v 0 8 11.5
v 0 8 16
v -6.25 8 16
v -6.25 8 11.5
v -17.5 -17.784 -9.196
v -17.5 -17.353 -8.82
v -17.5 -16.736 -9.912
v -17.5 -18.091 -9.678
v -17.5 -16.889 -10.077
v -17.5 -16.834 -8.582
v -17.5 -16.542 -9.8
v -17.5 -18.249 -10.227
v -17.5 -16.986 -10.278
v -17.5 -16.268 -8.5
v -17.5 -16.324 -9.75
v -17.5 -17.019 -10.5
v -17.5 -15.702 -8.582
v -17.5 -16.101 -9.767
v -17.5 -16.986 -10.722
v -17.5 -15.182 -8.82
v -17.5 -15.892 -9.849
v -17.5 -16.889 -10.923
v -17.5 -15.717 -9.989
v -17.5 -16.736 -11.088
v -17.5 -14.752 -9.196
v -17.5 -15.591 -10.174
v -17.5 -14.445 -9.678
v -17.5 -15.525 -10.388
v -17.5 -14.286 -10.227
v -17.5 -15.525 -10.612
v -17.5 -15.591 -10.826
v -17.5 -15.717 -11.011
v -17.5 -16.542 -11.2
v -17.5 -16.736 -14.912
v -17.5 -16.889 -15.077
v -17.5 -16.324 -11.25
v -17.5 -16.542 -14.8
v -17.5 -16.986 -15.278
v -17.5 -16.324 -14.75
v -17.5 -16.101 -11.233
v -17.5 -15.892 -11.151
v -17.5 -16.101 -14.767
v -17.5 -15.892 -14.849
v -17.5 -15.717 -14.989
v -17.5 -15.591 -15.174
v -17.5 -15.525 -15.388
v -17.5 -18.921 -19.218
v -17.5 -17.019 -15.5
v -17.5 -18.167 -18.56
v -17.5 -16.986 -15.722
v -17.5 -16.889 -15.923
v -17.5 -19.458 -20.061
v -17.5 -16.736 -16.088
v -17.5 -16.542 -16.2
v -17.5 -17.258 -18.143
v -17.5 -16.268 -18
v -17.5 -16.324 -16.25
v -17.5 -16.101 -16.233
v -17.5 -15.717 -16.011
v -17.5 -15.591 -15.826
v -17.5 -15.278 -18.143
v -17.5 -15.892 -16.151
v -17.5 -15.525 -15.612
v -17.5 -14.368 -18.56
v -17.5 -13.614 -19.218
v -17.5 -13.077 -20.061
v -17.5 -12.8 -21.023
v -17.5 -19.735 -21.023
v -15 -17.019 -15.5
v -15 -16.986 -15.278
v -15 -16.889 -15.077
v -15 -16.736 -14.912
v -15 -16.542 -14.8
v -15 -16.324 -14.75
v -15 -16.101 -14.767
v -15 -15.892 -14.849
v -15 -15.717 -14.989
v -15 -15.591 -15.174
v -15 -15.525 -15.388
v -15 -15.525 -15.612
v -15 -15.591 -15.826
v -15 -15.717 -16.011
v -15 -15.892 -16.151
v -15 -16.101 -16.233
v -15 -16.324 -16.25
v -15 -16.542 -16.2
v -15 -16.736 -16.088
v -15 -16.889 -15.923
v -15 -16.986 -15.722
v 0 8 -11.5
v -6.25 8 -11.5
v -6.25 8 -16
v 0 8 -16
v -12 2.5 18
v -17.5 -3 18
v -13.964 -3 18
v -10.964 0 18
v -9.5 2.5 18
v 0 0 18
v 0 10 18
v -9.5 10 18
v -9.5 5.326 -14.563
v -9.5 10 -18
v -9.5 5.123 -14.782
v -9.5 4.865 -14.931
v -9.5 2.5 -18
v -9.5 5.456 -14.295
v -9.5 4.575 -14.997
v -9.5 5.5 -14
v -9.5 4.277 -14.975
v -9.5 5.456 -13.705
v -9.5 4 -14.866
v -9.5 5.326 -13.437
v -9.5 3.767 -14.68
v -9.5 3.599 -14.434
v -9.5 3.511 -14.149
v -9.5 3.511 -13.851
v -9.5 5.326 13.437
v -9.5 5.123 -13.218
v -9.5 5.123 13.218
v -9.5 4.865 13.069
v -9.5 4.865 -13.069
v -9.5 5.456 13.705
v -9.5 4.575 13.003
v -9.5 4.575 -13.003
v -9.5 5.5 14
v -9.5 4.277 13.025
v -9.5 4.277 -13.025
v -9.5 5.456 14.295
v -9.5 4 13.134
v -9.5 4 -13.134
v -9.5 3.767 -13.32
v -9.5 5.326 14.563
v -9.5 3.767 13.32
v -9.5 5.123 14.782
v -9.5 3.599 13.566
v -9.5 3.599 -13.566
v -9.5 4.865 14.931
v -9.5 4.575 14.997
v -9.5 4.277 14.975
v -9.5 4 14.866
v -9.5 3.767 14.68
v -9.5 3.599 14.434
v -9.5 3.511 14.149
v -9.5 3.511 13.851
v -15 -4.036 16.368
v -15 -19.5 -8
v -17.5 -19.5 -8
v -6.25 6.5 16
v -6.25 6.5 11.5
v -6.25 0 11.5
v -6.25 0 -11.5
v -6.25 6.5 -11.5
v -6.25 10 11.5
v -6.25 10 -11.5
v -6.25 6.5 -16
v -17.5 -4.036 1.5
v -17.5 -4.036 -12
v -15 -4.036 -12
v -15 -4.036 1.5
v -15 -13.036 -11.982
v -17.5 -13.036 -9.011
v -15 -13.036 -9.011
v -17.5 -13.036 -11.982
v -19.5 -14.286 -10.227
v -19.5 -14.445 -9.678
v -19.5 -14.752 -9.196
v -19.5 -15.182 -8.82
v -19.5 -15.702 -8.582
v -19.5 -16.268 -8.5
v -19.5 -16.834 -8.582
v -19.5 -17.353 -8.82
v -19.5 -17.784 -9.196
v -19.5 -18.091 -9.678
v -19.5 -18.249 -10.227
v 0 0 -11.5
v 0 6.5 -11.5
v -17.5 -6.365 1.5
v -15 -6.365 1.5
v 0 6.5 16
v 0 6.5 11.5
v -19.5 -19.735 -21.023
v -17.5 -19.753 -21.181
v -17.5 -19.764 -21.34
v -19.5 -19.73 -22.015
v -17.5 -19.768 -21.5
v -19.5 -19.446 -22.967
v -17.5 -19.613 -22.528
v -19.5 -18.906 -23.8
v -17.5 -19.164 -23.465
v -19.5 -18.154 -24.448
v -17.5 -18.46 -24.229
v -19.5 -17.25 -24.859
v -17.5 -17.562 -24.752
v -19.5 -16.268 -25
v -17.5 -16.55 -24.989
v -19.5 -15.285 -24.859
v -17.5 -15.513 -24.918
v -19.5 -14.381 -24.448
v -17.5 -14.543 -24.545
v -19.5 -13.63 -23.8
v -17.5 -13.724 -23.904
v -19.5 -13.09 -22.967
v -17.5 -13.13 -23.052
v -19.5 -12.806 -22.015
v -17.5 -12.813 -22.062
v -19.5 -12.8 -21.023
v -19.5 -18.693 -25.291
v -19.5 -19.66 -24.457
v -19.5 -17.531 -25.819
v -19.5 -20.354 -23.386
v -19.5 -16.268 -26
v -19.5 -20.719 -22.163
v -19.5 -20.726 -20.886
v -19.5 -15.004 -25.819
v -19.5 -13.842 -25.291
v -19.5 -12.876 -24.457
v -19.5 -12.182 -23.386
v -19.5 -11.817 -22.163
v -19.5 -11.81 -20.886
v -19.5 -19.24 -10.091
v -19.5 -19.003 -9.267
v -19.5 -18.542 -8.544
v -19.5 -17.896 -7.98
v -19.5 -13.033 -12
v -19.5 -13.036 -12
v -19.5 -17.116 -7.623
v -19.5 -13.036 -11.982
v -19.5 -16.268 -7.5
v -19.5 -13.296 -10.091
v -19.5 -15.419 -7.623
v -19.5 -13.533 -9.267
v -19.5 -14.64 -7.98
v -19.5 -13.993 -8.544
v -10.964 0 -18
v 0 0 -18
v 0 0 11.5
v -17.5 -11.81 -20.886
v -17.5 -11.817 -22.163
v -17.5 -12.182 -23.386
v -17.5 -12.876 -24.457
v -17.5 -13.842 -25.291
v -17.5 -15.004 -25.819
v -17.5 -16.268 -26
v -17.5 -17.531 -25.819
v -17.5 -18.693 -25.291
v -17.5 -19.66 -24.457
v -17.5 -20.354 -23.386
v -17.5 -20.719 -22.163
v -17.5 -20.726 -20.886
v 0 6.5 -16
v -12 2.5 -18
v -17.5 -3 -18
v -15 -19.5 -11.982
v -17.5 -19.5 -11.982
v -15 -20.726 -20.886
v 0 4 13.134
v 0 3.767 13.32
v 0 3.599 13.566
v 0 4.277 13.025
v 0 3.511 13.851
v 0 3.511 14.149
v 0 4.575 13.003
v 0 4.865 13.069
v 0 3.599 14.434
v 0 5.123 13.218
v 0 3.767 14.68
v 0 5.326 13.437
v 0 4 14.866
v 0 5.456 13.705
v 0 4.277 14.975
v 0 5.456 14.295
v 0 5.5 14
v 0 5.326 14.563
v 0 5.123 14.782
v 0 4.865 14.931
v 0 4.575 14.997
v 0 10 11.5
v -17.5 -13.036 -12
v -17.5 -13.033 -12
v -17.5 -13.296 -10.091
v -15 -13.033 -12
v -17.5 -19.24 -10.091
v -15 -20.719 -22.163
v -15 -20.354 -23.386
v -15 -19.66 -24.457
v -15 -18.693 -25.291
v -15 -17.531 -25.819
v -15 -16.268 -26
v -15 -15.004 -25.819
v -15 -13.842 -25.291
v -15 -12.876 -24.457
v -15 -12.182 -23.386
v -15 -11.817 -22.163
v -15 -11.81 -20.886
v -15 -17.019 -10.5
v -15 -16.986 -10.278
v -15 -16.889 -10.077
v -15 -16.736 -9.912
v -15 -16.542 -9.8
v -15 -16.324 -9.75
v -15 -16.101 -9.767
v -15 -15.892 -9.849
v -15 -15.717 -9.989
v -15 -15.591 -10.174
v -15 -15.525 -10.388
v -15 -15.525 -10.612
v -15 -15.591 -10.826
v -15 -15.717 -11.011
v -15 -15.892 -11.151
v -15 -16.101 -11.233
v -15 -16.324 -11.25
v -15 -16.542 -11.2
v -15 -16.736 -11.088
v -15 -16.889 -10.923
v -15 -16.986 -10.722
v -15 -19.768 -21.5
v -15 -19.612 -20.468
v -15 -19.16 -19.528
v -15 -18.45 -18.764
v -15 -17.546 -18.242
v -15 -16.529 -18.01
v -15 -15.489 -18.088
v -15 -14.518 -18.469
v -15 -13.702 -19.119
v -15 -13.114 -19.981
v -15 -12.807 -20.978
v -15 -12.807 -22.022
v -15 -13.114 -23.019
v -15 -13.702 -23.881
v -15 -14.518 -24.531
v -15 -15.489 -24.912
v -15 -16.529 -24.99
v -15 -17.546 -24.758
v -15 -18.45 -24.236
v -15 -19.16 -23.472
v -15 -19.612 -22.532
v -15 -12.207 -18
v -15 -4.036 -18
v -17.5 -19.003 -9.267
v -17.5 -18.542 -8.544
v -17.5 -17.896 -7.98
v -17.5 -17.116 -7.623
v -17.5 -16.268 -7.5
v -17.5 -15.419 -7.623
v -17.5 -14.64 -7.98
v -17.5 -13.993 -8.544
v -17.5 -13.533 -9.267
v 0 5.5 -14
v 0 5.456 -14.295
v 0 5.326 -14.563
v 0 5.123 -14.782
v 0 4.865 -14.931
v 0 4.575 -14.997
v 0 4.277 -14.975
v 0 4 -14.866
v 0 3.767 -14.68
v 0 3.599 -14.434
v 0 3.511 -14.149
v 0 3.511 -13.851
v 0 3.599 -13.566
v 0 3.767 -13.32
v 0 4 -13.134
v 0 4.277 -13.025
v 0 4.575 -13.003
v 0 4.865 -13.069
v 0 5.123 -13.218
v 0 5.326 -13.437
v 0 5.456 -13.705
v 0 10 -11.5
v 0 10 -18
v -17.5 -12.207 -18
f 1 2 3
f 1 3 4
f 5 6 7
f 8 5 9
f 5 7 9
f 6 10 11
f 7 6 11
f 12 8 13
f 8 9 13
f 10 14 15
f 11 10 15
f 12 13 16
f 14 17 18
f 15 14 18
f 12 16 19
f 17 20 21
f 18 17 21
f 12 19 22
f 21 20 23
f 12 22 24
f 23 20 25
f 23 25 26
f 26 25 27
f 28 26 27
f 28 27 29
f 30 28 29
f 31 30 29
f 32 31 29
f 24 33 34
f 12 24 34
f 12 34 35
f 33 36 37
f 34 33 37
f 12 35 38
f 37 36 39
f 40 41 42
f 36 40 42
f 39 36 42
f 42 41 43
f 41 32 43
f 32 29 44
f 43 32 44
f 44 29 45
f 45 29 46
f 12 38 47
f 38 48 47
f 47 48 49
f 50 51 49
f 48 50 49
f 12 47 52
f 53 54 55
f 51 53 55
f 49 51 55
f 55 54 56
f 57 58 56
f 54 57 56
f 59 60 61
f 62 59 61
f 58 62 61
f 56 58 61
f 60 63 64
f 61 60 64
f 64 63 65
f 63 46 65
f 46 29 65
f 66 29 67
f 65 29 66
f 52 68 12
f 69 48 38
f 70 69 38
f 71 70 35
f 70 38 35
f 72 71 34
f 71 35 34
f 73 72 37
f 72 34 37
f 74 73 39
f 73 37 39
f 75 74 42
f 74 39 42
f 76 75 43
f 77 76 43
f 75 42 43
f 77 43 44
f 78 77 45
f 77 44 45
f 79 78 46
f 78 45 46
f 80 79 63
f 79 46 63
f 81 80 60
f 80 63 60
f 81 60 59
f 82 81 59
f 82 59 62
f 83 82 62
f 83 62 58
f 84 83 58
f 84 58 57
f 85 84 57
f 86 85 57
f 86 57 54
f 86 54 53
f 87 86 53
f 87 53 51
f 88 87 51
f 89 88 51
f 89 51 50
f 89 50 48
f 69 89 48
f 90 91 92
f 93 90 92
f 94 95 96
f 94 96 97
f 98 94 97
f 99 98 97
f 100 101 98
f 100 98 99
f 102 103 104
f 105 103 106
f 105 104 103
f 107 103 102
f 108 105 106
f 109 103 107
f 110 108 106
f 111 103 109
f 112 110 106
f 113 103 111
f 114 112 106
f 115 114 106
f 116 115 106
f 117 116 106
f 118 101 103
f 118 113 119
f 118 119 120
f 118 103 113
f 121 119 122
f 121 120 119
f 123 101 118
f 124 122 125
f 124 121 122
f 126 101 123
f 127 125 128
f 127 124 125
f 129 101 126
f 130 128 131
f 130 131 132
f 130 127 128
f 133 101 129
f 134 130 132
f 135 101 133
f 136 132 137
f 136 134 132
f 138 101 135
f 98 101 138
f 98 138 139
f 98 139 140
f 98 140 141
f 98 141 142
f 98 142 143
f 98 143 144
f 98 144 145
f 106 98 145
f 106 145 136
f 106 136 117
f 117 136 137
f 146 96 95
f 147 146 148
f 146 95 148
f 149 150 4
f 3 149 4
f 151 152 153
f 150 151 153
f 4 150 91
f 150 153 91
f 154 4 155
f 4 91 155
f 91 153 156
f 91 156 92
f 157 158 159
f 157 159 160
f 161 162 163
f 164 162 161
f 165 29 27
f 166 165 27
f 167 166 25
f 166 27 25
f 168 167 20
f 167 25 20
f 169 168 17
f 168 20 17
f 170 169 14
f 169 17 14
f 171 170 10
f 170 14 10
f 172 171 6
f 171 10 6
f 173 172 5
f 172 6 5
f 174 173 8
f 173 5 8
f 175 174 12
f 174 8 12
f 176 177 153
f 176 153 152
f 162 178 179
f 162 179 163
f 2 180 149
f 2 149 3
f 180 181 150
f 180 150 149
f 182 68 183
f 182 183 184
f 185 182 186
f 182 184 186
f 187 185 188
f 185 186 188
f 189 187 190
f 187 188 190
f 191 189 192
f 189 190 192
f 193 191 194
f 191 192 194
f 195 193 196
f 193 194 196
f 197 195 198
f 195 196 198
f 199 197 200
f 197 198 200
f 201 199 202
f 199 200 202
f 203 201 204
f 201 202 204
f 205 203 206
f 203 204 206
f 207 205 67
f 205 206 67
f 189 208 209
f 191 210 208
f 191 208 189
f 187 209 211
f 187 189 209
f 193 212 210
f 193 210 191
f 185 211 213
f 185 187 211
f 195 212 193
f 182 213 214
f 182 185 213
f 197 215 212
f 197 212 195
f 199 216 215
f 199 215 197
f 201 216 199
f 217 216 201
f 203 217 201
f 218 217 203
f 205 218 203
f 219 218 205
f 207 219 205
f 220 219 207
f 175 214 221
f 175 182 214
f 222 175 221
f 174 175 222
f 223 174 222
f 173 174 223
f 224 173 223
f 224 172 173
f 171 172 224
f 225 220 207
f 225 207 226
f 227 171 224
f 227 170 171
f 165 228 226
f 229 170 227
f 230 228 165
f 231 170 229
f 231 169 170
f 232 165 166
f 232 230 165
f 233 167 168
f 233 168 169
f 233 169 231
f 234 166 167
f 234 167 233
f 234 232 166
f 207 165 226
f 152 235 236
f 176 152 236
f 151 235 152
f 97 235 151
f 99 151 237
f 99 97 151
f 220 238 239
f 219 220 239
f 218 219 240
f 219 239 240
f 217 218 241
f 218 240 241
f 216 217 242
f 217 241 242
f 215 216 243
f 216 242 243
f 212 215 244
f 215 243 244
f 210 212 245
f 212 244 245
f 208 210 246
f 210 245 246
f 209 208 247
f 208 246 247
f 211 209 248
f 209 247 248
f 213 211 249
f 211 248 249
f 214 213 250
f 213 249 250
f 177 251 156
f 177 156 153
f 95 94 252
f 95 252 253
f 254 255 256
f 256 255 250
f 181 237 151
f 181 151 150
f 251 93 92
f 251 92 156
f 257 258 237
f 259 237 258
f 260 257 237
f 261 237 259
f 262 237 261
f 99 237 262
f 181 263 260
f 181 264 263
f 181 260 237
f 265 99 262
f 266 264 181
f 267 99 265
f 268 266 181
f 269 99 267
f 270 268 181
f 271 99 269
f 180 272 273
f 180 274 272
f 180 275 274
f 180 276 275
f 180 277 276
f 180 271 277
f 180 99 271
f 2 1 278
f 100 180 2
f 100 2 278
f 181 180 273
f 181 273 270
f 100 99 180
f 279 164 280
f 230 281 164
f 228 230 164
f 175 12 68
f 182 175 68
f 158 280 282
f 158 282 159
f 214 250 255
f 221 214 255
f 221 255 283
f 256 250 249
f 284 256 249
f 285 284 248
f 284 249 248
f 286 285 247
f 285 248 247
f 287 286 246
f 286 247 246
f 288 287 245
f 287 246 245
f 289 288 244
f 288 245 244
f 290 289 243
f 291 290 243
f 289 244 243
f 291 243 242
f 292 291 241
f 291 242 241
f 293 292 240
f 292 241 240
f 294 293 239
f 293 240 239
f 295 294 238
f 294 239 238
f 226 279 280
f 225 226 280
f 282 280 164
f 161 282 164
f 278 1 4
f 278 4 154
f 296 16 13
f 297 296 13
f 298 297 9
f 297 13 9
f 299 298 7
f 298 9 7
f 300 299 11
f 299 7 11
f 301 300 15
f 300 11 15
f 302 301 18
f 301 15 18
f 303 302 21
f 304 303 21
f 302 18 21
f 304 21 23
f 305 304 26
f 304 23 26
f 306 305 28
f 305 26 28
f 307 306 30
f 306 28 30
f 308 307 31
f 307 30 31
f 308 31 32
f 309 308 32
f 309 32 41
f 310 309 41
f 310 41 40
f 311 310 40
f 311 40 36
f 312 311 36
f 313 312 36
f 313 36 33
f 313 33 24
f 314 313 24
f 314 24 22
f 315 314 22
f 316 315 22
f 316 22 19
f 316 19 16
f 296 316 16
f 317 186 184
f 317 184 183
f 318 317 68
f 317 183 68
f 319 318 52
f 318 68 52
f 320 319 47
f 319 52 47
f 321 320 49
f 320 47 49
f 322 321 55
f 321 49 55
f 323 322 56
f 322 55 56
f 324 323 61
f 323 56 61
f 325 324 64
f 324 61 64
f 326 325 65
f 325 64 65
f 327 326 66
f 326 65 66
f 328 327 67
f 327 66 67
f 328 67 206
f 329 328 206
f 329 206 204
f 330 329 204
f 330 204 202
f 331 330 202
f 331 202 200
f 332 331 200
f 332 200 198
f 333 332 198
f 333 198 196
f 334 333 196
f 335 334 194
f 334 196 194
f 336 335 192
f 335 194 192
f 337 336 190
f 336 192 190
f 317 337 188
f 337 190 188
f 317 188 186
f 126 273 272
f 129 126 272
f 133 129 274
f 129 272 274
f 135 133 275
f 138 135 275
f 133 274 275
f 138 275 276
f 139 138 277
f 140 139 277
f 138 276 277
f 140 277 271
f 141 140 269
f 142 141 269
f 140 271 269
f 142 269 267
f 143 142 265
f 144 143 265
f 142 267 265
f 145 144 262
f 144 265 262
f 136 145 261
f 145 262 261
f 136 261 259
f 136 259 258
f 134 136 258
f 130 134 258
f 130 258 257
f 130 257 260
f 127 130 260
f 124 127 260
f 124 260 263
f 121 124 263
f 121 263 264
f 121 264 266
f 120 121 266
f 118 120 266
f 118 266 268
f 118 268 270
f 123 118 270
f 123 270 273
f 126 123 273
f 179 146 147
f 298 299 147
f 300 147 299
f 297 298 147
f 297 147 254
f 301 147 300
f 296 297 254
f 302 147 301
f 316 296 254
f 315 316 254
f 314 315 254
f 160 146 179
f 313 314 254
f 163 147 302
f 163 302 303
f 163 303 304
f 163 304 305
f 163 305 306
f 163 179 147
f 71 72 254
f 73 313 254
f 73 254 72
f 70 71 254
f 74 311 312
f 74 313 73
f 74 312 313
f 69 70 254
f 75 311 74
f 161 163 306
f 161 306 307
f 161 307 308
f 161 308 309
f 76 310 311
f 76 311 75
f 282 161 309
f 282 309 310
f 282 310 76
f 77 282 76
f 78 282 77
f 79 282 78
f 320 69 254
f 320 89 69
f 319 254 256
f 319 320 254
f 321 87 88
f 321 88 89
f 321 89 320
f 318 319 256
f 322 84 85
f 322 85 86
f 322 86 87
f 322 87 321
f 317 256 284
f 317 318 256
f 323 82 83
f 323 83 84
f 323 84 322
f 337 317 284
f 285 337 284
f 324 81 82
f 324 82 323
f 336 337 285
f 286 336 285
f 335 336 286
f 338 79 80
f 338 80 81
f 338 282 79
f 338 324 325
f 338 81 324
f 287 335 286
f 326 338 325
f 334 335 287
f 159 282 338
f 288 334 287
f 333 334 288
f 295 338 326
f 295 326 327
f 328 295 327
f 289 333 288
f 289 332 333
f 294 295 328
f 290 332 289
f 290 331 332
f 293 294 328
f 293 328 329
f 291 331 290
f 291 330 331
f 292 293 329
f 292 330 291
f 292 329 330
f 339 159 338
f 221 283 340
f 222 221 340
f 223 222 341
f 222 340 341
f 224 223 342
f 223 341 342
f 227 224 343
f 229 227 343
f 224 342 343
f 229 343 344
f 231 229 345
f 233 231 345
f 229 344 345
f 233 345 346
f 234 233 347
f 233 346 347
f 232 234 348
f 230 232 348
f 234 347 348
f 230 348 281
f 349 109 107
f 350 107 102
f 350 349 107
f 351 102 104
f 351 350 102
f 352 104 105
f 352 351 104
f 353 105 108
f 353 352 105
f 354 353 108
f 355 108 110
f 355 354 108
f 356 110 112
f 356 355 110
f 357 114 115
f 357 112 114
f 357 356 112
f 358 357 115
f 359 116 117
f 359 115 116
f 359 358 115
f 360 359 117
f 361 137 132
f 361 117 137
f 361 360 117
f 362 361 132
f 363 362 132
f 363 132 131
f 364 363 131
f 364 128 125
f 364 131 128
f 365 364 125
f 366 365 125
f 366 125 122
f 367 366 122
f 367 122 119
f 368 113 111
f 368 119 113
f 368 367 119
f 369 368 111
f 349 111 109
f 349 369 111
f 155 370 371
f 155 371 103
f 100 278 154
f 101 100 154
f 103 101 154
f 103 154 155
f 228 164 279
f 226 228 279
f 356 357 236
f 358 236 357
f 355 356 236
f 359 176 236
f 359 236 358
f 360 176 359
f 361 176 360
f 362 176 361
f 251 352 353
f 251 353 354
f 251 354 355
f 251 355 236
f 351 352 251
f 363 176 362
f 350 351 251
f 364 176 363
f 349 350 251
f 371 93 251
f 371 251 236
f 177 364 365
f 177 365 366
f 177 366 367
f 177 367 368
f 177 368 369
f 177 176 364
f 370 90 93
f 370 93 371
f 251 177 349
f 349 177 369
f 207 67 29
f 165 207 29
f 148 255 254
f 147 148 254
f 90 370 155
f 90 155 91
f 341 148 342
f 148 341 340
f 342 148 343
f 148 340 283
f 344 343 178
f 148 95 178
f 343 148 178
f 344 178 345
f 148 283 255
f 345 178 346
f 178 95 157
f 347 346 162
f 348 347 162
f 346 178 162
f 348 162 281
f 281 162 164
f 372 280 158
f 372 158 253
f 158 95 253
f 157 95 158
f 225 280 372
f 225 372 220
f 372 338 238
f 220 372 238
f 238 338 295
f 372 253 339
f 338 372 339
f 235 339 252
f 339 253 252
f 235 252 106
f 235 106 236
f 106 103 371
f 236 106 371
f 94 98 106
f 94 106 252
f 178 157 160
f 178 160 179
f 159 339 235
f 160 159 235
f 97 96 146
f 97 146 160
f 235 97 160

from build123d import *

# Parameters (mm, degrees)
EXTRUDE_1_DEPTH     = 18
CUT_EXTRUDE_1_REACH = 33.788
CUT_EXTRUDE_2_DEPTH = 6.25
SKETCH_4_R          = 1.0000000000000013
CUT_EXTRUDE_3_DEPTH = 10
SKETCH_8_R          = 3.4999999999999996
SKETCH_8_R_2        = 0.751628678477691
SKETCH_8_R_3        = 0.7516286784776927
EXTRUDE_2_DEPTH     = 2.5
EXTRUDE_3_DEPTH     = 2
CUT_EXTRUDE_4_REACH = 39.597
SKETCH_8_4_R        = 0.751628678477691
SKETCH_8_4_R_2      = 0.7516286784776927


# Read off the part's stored shape, not the designer's step: 凸台-拉伸3
with BuildPart() as part:
    # 草图1 → 凸台-拉伸1 (new, symmetric)
    with BuildSketch(Plane.XY):
        Polygon((0, 0), (0, 10), (-9.5, 9.999999999999998), (-9.499999999999998, 2.5000000000000004), (-11.999999999999998, 2.5), (-17.499999999999996, -3.0000000000000218), (-17.499999999999996, -19.5), (-14.999999999999995, -19.500000000000004), (-14.999999999999995, -4.035533905932752), (-10.964466094067257, -4e-17), align=None)
    extrude(amount=EXTRUDE_1_DEPTH, both=True)

    # 草图2 → 切除-拉伸1 (cut, up to next)
    with BuildSketch(Plane.ZY.offset(17.499999999999996), mode=Mode.PRIVATE) as cut_extrude_1_sk1:
        Polygon((-9.011266099163953, -13.03553390593275), (-11.999999999999996, -13.03553390593275), (-11.999999999999998, -4.035533905932751), (1.5000000000000013, -4.035533905932748), (1.500000000000002, -6.364922727617167), align=None)
    cut_extrude_1_tool1 = extrude(cut_extrude_1_sk1.sketch, amount=-CUT_EXTRUDE_1_REACH, mode=Mode.PRIVATE) & part.part
    # 草图2 → 切除-拉伸1 (cut, up to next)
    with BuildSketch(Plane.ZY.offset(17.499999999999996), mode=Mode.PRIVATE) as cut_extrude_1_sk2:
        Polygon((-7.9999999999999964, -19.499999999999996), (18, -19.49999999999999), (18, -3.000000000000014), align=None)
    cut_extrude_1_tool2 = extrude(cut_extrude_1_sk2.sketch, amount=-CUT_EXTRUDE_1_REACH, mode=Mode.PRIVATE) & part.part
    add(cut_extrude_1_tool1.solids().sort_by_distance((-17.5, -7.612266, -6.566584))[0], mode=Mode.SUBTRACT)
    add(cut_extrude_1_tool2.solids().sort_by_distance((-17.5, -14, 9.333333))[0], mode=Mode.SUBTRACT)

    # 草图3 → 切除-拉伸2 (cut, symmetric)
    with BuildSketch(Plane(origin=(0, 8.89452112858794, -0.8331769279117781), x_dir=(0, -1, 0), z_dir=(1, 0, 0))):
        Polygon((2.3945211285879346, 15.166823072088224), (2.3945211285879346, 10.666823072088222), (8.894521128587936, 10.666823072088222), (8.894521128587936, -12.333176927911778), (2.394521128587931, -12.333176927911778), (2.3945211285879346, -16.833176927911776), (0.8945211285879351, -16.833176927911776), (0.8945211285879351, -12.33317692791178), (-3.1054788714120676, -12.333176927911778), (-3.105478871412064, 10.66682307208822), (0.8945211285879369, 10.66682307208822), (0.8945211285879351, 15.166823072088224), align=None)
    extrude(amount=CUT_EXTRUDE_2_DEPTH, both=True, mode=Mode.SUBTRACT)

    # 草图4 → 切除-拉伸3 (cut)
    with BuildSketch(Plane(origin=(0, 0, 0), x_dir=(0, 0, -1), z_dir=(1, 0, 0))):
        with Locations(Location((-14, 4.500000000000008, 0), (0, 0, 90))):
            Circle(SKETCH_4_R)
    cut_extrude_3 = extrude(amount=-CUT_EXTRUDE_3_DEPTH, mode=Mode.SUBTRACT)

    # 镜向1: 切除-拉伸3 across plane
    add(cut_extrude_3.mirror(Plane.XY), mode=Mode.SUBTRACT)

    # 草图8 → 凸台-拉伸2 (add)
    with BuildSketch(Plane.ZY.offset(17.499999999999996)):
        with BuildLine():
            Line((-20.886363636363633, -11.809802124345238), (-10.090909090909088, -13.295790400552288))
            ThreePointArc((-10.090909090909088, -13.295790400552288), (-7.50000000000001, -16.26776695296638), (-10.090909090909088, -19.239743505380464))
            Line((-10.090909090909088, -19.239743505380464), (-20.886363636363633, -20.725731781587513))
            ThreePointArc((-20.886363636363633, -20.725731781587513), (-25.999999999999996, -16.267766952966376), (-20.886363636363633, -11.809802124345238))
        make_face()
        with Locations(Location((-21.5, -16.267766952966376, 0), (0, 0, 270))):
            Circle(SKETCH_8_R, mode=Mode.SUBTRACT)
        with Locations((-15.499999999999998, -16.267766952966372)):
            Circle(SKETCH_8_R_2, mode=Mode.SUBTRACT)
        with Locations((-10.499999999999998, -16.26776695296638)):
            Circle(SKETCH_8_R_3, mode=Mode.SUBTRACT)
    extrude(amount=-EXTRUDE_2_DEPTH)

    # 凸台-拉伸3 outline → 凸台-拉伸3 (add)
    with BuildSketch(Plane.ZY.offset(17.499999999999996)):
        with BuildLine():
            Line((-11.98162869, -13.035533906), (-12, -13.035533906))
            Line((-12, -13.035533906), (-12, -13.033005105))
            Line((-12, -13.033005105), (-20.886363636, -11.809802124))
            ThreePointArc((-20.886363636, -11.809802124), (-26, -16.267766953), (-20.886363636, -20.725731782))
            Line((-20.886363636, -20.725731782), (-10.090909091, -19.239743505))
            ThreePointArc((-10.090909091, -19.239743505), (-7.5, -16.267766953), (-10.090909091, -13.295790401))
            Line((-10.090909091, -13.295790401), (-11.98162869, -13.035533906))
        make_face()
        with BuildLine():
            ThreePointArc((-21.022727273, -19.735072931), (-25, -16.267766953), (-21.022727273, -12.800460975))
            Line((-21.022727273, -12.800460975), (-10.227272727, -14.286449251))
            ThreePointArc((-10.227272727, -14.286449251), (-8.5, -16.267766953), (-10.227272727, -18.249084655))
            Line((-10.227272727, -18.249084655), (-21.022727273, -19.735072931))
        make_face(mode=Mode.SUBTRACT)
    extrude(amount=EXTRUDE_3_DEPTH)

    # 草图8<4> → 切除-拉伸4 (cut, up to next)
    with BuildSketch(Plane.ZY.offset(17.499999999999996), mode=Mode.PRIVATE) as cut_extrude_4_sk1:
        with Locations(Location((-15.499999999999998, -16.267766952966372, 0), (0, 0, 270))):
            Circle(SKETCH_8_4_R)
    cut_extrude_4_tool1 = extrude(cut_extrude_4_sk1.sketch, amount=-CUT_EXTRUDE_4_REACH, mode=Mode.PRIVATE) & part.part
    # 草图8<4> → 切除-拉伸4 (cut, up to next)
    with BuildSketch(Plane.ZY.offset(17.499999999999996), mode=Mode.PRIVATE) as cut_extrude_4_sk2:
        with Locations(Location((-10.499999999999998, -16.26776695296638, 0), (0, 0, 270))):
            Circle(SKETCH_8_4_R_2)
    cut_extrude_4_tool2 = extrude(cut_extrude_4_sk2.sketch, amount=-CUT_EXTRUDE_4_REACH, mode=Mode.PRIVATE) & part.part
    add(cut_extrude_4_tool1.solids().sort_by_distance((-17.5, -16.267767, -15.5))[0], mode=Mode.SUBTRACT)
    add(cut_extrude_4_tool2.solids().sort_by_distance((-17.5, -16.267767, -10.5))[0], mode=Mode.SUBTRACT)


solid = part.part
